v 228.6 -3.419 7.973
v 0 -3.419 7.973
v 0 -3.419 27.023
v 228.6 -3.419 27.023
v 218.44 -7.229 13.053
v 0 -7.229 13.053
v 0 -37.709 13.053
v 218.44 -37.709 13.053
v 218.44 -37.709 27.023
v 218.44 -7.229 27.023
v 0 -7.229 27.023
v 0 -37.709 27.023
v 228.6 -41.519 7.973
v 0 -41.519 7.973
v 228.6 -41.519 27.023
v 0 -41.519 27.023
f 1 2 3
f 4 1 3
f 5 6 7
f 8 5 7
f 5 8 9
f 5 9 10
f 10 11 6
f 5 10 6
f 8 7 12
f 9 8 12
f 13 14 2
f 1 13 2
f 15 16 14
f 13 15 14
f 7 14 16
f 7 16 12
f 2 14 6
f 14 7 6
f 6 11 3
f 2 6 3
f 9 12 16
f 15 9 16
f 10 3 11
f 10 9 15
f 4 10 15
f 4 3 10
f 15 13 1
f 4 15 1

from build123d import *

# Parameters (mm, degrees)
F1_DEPTH = 228.6
F2_DEPTH = 228.6
F3_W     = 10.16
F3_H     = 30.48
F4_DEPTH = 13.97


with BuildPart() as f1:
    # F0 (on Right) → F1 (new body)
    with BuildSketch(Plane.YZ):
        Polygon((-41.518882, 27.023025), (-41.518882, 7.973025), (-3.418882, 7.973025), (-3.418882, 27.023025), (-7.228882, 27.023025), (-7.228882, 13.053025), (-37.708882, 13.053025), (-37.708882, 27.023025), align=None)
    extrude(amount=F1_DEPTH)

    # F0 (on Right) → F2 (join)
    with BuildSketch(Plane.YZ):
        Polygon((-41.518882, 27.023025), (-41.518882, 7.973025), (-3.418882, 7.973025), (-3.418882, 27.023025), (-7.228882, 27.023025), (-7.228882, 13.053025), (-37.708882, 13.053025), (-37.708882, 27.023025), align=None)
    extrude(amount=F2_DEPTH)

    # F3 (on face) → F4 (join)
    with BuildSketch(Plane.XY.offset(13.053025)):
        with Locations((223.52, -22.468882)):
            Rectangle(F3_W, F3_H)
    extrude(amount=F4_DEPTH)


with BuildPart() as f5_1:
    # F5: copy of F1
    add(f1.part)


solid = f1.part
